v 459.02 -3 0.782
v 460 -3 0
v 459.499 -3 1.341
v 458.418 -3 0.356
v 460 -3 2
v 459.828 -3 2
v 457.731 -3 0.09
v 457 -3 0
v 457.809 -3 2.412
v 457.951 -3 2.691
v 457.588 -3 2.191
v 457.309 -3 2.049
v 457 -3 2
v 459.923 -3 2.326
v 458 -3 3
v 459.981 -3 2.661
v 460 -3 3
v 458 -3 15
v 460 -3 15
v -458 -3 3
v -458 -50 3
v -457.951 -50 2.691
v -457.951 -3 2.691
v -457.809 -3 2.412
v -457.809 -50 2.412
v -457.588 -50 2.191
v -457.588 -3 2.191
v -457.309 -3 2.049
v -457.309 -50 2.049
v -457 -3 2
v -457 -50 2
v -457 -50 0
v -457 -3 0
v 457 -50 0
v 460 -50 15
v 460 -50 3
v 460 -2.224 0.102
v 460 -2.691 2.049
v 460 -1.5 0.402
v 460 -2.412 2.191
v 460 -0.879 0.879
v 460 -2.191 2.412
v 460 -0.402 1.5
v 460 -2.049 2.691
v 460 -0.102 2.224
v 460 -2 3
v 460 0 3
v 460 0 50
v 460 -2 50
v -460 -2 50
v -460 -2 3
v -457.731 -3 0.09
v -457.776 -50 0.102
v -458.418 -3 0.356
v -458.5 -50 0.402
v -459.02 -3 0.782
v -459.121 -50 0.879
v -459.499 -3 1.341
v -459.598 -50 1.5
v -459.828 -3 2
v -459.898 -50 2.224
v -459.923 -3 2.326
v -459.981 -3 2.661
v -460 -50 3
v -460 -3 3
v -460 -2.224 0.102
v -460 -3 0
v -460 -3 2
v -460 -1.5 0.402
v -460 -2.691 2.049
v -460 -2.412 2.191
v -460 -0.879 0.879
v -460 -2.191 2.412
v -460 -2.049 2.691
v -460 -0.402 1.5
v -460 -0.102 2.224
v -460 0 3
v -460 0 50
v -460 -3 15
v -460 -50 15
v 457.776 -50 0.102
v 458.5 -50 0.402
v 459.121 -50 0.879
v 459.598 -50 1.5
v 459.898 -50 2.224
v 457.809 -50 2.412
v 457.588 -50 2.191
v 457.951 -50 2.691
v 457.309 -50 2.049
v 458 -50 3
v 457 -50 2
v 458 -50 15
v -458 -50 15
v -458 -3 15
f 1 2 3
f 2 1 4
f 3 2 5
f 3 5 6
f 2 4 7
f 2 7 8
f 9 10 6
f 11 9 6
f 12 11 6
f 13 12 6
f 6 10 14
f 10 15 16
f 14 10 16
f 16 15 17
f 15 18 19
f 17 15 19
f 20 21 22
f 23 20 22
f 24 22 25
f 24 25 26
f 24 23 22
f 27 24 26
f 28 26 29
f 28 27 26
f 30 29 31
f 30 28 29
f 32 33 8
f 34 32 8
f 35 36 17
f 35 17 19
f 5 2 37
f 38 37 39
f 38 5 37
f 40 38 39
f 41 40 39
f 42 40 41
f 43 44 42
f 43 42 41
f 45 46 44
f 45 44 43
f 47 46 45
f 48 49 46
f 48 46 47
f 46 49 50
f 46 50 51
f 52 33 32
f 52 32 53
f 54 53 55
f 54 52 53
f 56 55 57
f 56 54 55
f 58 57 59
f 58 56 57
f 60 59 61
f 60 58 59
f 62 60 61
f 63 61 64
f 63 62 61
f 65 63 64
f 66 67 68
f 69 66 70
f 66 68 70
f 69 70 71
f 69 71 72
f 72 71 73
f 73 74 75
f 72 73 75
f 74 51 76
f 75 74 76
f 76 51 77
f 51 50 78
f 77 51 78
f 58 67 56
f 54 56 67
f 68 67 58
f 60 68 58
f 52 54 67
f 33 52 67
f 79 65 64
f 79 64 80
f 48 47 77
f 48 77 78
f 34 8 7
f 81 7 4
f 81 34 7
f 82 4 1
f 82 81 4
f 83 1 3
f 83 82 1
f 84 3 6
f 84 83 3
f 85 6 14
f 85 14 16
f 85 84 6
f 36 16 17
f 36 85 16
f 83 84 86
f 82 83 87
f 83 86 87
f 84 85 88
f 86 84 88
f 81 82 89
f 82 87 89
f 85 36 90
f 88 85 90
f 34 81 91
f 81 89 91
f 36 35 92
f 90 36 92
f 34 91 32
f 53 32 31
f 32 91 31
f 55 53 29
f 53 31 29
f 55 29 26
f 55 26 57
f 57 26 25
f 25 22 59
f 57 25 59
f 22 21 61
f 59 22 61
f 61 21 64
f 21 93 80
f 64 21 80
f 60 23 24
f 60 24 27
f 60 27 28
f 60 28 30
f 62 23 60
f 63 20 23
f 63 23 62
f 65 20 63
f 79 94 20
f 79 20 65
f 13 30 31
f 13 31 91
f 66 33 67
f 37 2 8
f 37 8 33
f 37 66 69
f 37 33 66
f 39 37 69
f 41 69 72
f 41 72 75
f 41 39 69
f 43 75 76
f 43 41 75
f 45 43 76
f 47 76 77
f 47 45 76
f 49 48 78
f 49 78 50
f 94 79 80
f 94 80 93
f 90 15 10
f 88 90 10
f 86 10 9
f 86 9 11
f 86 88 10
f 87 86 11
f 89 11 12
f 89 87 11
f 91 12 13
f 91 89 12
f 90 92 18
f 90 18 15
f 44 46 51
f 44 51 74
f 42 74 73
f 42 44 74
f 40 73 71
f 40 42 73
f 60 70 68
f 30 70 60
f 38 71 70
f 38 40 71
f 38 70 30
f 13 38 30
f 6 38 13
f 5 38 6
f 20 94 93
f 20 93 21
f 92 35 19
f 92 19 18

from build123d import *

# Parameters (mm, degrees)
BASEFLANGE_W                   = 920
BASEFLANGE_H                   = 50
BASE_FLANGE1_DEPTH             = 2
EDGE_FLANGE1_STRIP_W           = 10
EDGE_FLANGE1_STRIP_H           = 2
EDGE_FLANGE1_STRIP_CUT_DEPTH   = 920
EDGE_FLANGE1_DEPTH             = 920
EDGE_FLANGE2_STRIP_W           = 10
EDGE_FLANGE2_STRIP_H           = 2
EDGE_FLANGE2_STRIP_CUT_DEPTH   = 47
EDGE_FLANGE2_STRIP_2_W         = 10
EDGE_FLANGE2_STRIP_2_H         = 2
EDGE_FLANGE2_STRIP_CUT_2_DEPTH = 47
EDGE_FLANGE2_DEPTH             = 47
EDGE_FLANGE2_BEND_DEPTH        = 47


# Sheet-metal steps are written as plain solids
with BuildPart() as part:
    # BaseFlange → Base-Flange1 (new body)
    with BuildSketch(Plane.XY):
        with Locations((0, -25)):
            Rectangle(BASEFLANGE_W, BASEFLANGE_H)
    extrude(amount=BASE_FLANGE1_DEPTH)

    # Edge-Flange1 strip (across the edge) → Edge-Flange1 strip cut (cut)
    with BuildSketch(Plane(origin=(460, 0, 2), x_dir=(0, -1, 0), z_dir=(-1, 0, 0))):
        with Locations((-2, -1)):
            Rectangle(EDGE_FLANGE1_STRIP_W, EDGE_FLANGE1_STRIP_H)
    extrude(amount=EDGE_FLANGE1_STRIP_CUT_DEPTH, mode=Mode.SUBTRACT)

    # Edge-Flange1 section (across the edge) → Edge-Flange1 (add)
    with BuildSketch(Plane(origin=(460, 0, 2), x_dir=(0, -1, 0), z_dir=(-1, 0, 0))):
        with BuildLine():
            Line((0, 1), (0, 48))
            Line((0, 48), (2, 48))
            Line((2, 48), (2, 1))
            ThreePointArc((2, 1), (2.292893219, 0.292893219), (3, 0))
            Line((3, 0), (3, -2))
            ThreePointArc((3, -2), (0.878679656, -1.121320344), (0, 1))
        make_face()
    extrude(amount=EDGE_FLANGE1_DEPTH)

    # Edge-Flange2 strip (across the edge) → Edge-Flange2 strip cut (cut)
    with BuildSketch(Plane(origin=(460, -50, 2), x_dir=(-1, 0, 0), z_dir=(0, 1, 0))):
        with Locations((-2, -1)):
            Rectangle(EDGE_FLANGE2_STRIP_W, EDGE_FLANGE2_STRIP_H)
    extrude(amount=EDGE_FLANGE2_STRIP_CUT_DEPTH, mode=Mode.SUBTRACT)

    # Edge-Flange2 strip 2 (across the edge) → Edge-Flange2 strip cut 2 (cut)
    with BuildSketch(Plane(origin=(-460, -3, 2), x_dir=(1, 0, 0), z_dir=(0, -1, 0))):
        with Locations((-2, -1)):
            Rectangle(EDGE_FLANGE2_STRIP_2_W, EDGE_FLANGE2_STRIP_2_H)
    extrude(amount=EDGE_FLANGE2_STRIP_CUT_2_DEPTH, mode=Mode.SUBTRACT)

    # Edge-Flange2 section (across the edge) → Edge-Flange2 (add)
    with BuildSketch(Plane(origin=(460, -50, 2), x_dir=(-1, 0, 0), z_dir=(0, 1, 0))):
        with BuildLine():
            Line((0, 1), (0, 13))
            Line((0, 13), (2, 13))
            Line((2, 13), (2, 1))
            ThreePointArc((2, 1), (2.292893219, 0.292893219), (3, 0))
            Line((3, 0), (3, -2))
            ThreePointArc((3, -2), (0.878679656, -1.121320344), (0, 1))
        make_face()
    extrude(amount=EDGE_FLANGE2_DEPTH)

    # Edge-Flange2 section 2 (across the edge) → Edge-Flange2 bend (add)
    with BuildSketch(Plane(origin=(-460, -3, 2), x_dir=(1, 0, 0), z_dir=(0, -1, 0))):
        with BuildLine():
            Line((0, 1), (0, 13))
            Line((0, 13), (2, 13))
            Line((2, 13), (2, 1))
            ThreePointArc((2, 1), (2.292893219, 0.292893219), (3, 0))
            Line((3, 0), (3, -2))
            ThreePointArc((3, -2), (0.878679656, -1.121320344), (0, 1))
        make_face()
    extrude(amount=EDGE_FLANGE2_BEND_DEPTH)


solid = part.part
